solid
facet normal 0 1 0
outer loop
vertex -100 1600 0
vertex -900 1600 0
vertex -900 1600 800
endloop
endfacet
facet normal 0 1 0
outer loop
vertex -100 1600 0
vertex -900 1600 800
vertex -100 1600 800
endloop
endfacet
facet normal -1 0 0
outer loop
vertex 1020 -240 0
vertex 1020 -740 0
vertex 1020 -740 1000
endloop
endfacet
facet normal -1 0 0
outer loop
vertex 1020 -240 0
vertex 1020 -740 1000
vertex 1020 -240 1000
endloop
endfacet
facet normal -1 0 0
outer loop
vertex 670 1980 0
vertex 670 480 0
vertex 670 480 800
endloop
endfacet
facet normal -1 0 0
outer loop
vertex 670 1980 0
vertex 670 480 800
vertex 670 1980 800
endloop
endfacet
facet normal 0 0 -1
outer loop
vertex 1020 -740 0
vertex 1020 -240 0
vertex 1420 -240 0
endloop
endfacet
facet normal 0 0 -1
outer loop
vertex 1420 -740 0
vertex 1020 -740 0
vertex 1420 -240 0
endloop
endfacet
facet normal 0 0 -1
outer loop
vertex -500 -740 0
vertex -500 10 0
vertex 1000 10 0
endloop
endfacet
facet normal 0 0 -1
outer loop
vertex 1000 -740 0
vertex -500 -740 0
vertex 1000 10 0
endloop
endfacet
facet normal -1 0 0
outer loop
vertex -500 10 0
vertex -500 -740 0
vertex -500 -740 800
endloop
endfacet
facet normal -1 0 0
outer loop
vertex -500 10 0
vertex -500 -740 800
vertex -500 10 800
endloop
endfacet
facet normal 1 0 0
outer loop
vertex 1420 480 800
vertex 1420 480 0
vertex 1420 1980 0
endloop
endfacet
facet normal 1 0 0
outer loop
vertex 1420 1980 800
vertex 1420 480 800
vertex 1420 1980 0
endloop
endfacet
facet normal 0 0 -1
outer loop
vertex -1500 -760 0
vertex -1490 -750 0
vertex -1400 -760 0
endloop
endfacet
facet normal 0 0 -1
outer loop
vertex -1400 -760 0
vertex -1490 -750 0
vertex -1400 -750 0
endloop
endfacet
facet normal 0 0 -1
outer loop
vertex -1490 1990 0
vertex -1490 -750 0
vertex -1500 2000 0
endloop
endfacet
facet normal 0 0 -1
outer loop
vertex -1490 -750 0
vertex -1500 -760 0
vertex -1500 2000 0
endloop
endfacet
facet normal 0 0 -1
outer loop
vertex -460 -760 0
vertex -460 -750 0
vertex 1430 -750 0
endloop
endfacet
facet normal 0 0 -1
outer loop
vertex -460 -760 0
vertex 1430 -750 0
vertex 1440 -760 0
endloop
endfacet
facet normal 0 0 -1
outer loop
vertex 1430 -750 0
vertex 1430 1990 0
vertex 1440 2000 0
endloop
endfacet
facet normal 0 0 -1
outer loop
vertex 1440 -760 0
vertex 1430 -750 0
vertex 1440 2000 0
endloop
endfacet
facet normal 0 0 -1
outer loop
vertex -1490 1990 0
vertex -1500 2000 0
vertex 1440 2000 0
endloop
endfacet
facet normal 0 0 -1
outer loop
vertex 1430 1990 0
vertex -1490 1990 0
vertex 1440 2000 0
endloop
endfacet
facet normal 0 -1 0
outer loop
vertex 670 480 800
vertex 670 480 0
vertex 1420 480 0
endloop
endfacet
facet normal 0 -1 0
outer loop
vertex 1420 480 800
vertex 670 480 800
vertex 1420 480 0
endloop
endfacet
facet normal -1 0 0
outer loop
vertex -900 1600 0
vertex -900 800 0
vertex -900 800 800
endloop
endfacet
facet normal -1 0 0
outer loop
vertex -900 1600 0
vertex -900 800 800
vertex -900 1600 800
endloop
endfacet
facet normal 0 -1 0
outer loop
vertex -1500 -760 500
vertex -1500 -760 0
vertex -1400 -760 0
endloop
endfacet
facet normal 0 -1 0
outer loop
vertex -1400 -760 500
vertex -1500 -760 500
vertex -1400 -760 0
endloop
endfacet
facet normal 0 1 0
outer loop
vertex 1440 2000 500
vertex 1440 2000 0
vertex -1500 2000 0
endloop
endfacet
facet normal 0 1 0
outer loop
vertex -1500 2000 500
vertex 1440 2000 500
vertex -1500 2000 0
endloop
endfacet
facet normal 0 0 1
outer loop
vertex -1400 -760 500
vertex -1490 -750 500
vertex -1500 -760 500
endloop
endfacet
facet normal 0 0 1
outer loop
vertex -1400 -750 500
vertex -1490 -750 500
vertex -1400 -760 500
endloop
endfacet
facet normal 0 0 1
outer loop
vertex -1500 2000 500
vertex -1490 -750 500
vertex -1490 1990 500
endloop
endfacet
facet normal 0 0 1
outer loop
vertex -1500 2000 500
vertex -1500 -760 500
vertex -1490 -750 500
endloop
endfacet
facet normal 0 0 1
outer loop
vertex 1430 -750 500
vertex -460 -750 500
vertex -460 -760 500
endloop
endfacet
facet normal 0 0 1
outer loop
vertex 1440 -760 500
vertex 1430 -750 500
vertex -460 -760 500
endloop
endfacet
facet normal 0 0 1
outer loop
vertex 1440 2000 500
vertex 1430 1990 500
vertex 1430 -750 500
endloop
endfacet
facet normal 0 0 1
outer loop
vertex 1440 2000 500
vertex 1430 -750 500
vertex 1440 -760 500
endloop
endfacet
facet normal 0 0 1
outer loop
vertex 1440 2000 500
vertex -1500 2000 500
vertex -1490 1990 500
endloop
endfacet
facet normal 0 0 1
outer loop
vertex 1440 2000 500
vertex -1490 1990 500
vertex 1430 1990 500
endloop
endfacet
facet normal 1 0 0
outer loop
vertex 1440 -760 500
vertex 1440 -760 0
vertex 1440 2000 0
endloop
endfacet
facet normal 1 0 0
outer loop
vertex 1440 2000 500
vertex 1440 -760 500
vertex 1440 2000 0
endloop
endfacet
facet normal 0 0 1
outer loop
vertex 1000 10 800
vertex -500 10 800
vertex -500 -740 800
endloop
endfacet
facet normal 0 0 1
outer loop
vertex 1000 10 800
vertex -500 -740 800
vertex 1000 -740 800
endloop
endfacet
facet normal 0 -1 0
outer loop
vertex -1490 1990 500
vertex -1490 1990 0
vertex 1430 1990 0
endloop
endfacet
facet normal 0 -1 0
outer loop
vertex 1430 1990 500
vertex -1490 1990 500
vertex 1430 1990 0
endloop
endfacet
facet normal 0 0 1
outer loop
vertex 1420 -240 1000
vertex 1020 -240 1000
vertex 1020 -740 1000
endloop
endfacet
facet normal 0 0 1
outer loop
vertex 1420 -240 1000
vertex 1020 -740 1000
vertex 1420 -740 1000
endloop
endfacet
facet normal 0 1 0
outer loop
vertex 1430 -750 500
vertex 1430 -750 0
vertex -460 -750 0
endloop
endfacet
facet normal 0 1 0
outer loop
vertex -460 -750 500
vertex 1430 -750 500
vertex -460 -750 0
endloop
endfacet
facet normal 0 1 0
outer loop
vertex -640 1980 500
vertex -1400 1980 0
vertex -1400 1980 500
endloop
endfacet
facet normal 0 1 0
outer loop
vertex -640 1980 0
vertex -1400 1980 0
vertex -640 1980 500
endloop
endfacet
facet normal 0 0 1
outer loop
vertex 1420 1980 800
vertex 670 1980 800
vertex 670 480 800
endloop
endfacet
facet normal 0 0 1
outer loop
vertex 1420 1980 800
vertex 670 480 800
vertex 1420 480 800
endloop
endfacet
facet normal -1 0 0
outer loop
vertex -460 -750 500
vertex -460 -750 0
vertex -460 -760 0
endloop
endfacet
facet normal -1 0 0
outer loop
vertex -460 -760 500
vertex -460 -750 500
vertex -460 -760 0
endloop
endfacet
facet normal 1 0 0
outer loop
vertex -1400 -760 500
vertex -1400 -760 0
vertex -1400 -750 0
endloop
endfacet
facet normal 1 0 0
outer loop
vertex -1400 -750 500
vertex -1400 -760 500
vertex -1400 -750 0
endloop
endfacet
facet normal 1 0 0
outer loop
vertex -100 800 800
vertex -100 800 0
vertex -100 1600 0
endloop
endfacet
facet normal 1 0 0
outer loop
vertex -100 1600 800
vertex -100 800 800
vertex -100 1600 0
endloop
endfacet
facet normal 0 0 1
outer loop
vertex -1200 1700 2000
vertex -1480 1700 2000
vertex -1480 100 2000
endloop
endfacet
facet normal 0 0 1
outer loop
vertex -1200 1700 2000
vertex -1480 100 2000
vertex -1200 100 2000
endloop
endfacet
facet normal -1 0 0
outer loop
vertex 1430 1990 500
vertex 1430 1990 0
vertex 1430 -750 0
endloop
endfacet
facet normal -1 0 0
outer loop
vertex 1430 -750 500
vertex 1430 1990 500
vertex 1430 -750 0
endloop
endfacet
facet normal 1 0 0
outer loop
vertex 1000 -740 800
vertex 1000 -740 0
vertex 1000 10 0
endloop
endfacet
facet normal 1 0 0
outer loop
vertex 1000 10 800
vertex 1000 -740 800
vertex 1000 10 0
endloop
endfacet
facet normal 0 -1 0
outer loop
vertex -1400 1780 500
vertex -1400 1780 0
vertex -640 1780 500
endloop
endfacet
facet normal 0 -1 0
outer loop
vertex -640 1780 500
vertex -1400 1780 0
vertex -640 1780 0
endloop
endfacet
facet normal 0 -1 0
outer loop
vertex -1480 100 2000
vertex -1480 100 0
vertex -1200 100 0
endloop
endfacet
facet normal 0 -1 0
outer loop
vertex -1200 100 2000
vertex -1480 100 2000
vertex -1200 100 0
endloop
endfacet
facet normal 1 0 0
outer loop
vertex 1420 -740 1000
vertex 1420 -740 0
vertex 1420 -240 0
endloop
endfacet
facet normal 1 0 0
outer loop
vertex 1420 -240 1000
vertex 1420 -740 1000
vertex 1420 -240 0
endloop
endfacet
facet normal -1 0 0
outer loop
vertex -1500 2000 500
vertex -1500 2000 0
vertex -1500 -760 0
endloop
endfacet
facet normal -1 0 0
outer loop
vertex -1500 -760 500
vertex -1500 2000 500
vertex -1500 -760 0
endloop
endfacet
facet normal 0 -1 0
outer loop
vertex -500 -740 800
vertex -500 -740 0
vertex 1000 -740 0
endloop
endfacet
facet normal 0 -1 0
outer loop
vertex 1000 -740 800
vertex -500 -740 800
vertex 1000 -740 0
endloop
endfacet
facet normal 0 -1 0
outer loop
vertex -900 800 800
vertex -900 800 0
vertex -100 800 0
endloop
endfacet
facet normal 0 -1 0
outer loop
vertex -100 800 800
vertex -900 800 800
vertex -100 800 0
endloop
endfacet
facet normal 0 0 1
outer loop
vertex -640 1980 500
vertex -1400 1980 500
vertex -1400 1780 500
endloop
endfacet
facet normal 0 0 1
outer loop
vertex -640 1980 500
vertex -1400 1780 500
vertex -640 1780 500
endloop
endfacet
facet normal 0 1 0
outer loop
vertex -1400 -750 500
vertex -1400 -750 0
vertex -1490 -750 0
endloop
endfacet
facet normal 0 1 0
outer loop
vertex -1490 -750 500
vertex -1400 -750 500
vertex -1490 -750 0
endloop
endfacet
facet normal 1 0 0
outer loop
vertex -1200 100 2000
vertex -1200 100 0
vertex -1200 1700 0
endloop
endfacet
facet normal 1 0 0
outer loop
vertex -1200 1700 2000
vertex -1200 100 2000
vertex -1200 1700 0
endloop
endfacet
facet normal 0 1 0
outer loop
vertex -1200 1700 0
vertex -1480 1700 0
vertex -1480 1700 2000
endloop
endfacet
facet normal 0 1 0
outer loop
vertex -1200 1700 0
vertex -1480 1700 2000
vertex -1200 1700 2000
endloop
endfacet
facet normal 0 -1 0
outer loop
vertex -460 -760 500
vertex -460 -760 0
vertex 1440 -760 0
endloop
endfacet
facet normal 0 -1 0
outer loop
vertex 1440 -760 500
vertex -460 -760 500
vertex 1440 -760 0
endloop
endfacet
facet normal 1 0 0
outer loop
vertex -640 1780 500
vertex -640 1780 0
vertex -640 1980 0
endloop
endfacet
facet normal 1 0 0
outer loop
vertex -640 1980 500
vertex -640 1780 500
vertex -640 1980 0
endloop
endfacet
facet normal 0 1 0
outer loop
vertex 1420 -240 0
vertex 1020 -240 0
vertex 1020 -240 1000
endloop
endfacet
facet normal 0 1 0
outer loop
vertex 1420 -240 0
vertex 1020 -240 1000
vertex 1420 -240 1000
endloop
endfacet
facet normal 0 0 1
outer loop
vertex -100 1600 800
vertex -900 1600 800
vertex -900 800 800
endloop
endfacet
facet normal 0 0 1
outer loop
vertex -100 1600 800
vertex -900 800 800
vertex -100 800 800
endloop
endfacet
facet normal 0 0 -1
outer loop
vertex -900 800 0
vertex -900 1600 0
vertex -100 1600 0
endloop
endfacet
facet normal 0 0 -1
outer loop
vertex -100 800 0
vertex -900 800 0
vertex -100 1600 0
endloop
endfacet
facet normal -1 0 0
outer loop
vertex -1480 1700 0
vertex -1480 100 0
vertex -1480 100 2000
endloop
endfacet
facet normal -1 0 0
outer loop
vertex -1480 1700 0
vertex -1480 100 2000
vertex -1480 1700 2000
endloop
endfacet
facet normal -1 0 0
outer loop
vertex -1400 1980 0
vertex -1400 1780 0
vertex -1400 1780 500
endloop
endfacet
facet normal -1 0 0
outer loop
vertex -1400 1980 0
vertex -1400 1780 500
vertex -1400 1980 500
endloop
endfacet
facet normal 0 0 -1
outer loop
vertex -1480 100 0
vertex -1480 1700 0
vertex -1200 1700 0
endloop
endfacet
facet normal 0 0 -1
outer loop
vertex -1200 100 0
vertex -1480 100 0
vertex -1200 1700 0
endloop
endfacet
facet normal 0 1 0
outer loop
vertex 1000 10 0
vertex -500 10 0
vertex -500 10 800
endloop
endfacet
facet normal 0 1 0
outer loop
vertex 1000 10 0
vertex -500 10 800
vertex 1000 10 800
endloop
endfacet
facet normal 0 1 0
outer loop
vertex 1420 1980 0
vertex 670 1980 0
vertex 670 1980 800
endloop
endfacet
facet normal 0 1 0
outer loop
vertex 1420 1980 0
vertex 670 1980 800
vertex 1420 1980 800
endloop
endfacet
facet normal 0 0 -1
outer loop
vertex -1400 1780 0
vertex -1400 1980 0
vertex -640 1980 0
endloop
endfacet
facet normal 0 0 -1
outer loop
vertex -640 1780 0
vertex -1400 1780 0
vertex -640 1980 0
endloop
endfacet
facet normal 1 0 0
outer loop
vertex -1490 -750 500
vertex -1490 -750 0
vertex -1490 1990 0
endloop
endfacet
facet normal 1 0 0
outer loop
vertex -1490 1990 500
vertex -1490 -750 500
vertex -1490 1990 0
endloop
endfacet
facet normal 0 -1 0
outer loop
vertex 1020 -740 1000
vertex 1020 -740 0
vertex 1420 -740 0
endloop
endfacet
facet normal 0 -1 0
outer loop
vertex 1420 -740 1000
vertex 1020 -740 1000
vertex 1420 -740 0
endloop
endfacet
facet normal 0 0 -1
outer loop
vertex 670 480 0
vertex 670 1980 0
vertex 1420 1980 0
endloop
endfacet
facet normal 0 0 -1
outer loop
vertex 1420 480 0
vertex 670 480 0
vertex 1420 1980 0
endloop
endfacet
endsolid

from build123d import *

# Parameters (mm, degrees)
F1_DEPTH = 500
F0_W     = 280
F0_H     = 1600
F2_DEPTH = 2000
F0_W_2   = 760
F0_H_2   = 200
F3_DEPTH = 500
F0_W_3   = 800
F0_H_3   = 800
F4_DEPTH = 800
F0_W_4   = 400
F0_H_4   = 500
F5_DEPTH = 1000
F0_W_5   = 1500
F0_H_5   = 750
F6_DEPTH = 800
F0_W_6   = 750
F0_H_6   = 1500
F7_DEPTH = 800


with BuildPart() as f1:
    # F0 (on Top) → F1 (new body)
    with BuildSketch(Plane.XY):
        Polygon((-1490, -750), (-1490, 1990), (1430, 1990), (1430, -750), (-460, -750), (-460, -760), (1440, -760), (1440, 2000), (-1500, 2000), (-1500, -760), (-1400, -760), (-1400, -750), align=None)
    extrude(amount=F1_DEPTH)


with BuildPart() as f2:
    # F0 (on Top) → F2 (new body)
    with BuildSketch(Plane.XY):
        with Locations((-1340, 900)):
            Rectangle(F0_W, F0_H)
    extrude(amount=F2_DEPTH)


with BuildPart() as f3:
    # F0 (on Top) → F3 (new body)
    with BuildSketch(Plane.XY):
        with Locations((-1020, 1880)):
            Rectangle(F0_W_2, F0_H_2)
    extrude(amount=F3_DEPTH)


with BuildPart() as f4:
    # F0 (on Top) → F4 (new body)
    with BuildSketch(Plane.XY):
        with Locations((-500, 1200)):
            Rectangle(F0_W_3, F0_H_3)
    extrude(amount=F4_DEPTH)


with BuildPart() as f5:
    # F0 (on Top) → F5 (new body)
    with BuildSketch(Plane.XY):
        with Locations((1220, -490)):
            Rectangle(F0_W_4, F0_H_4)
    extrude(amount=F5_DEPTH)


with BuildPart() as f6:
    # F0 (on Top) → F6 (new body)
    with BuildSketch(Plane.XY):
        with Locations((250, -365)):
            Rectangle(F0_W_5, F0_H_5)
    extrude(amount=F6_DEPTH)


with BuildPart() as f7:
    # F0 (on Top) → F7 (new body)
    with BuildSketch(Plane.XY):
        with Locations((1045, 1230)):
            Rectangle(F0_W_6, F0_H_6)
    extrude(amount=F7_DEPTH)


solid = Compound([f1.part, f2.part, f3.part, f4.part, f5.part, f6.part, f7.part])
